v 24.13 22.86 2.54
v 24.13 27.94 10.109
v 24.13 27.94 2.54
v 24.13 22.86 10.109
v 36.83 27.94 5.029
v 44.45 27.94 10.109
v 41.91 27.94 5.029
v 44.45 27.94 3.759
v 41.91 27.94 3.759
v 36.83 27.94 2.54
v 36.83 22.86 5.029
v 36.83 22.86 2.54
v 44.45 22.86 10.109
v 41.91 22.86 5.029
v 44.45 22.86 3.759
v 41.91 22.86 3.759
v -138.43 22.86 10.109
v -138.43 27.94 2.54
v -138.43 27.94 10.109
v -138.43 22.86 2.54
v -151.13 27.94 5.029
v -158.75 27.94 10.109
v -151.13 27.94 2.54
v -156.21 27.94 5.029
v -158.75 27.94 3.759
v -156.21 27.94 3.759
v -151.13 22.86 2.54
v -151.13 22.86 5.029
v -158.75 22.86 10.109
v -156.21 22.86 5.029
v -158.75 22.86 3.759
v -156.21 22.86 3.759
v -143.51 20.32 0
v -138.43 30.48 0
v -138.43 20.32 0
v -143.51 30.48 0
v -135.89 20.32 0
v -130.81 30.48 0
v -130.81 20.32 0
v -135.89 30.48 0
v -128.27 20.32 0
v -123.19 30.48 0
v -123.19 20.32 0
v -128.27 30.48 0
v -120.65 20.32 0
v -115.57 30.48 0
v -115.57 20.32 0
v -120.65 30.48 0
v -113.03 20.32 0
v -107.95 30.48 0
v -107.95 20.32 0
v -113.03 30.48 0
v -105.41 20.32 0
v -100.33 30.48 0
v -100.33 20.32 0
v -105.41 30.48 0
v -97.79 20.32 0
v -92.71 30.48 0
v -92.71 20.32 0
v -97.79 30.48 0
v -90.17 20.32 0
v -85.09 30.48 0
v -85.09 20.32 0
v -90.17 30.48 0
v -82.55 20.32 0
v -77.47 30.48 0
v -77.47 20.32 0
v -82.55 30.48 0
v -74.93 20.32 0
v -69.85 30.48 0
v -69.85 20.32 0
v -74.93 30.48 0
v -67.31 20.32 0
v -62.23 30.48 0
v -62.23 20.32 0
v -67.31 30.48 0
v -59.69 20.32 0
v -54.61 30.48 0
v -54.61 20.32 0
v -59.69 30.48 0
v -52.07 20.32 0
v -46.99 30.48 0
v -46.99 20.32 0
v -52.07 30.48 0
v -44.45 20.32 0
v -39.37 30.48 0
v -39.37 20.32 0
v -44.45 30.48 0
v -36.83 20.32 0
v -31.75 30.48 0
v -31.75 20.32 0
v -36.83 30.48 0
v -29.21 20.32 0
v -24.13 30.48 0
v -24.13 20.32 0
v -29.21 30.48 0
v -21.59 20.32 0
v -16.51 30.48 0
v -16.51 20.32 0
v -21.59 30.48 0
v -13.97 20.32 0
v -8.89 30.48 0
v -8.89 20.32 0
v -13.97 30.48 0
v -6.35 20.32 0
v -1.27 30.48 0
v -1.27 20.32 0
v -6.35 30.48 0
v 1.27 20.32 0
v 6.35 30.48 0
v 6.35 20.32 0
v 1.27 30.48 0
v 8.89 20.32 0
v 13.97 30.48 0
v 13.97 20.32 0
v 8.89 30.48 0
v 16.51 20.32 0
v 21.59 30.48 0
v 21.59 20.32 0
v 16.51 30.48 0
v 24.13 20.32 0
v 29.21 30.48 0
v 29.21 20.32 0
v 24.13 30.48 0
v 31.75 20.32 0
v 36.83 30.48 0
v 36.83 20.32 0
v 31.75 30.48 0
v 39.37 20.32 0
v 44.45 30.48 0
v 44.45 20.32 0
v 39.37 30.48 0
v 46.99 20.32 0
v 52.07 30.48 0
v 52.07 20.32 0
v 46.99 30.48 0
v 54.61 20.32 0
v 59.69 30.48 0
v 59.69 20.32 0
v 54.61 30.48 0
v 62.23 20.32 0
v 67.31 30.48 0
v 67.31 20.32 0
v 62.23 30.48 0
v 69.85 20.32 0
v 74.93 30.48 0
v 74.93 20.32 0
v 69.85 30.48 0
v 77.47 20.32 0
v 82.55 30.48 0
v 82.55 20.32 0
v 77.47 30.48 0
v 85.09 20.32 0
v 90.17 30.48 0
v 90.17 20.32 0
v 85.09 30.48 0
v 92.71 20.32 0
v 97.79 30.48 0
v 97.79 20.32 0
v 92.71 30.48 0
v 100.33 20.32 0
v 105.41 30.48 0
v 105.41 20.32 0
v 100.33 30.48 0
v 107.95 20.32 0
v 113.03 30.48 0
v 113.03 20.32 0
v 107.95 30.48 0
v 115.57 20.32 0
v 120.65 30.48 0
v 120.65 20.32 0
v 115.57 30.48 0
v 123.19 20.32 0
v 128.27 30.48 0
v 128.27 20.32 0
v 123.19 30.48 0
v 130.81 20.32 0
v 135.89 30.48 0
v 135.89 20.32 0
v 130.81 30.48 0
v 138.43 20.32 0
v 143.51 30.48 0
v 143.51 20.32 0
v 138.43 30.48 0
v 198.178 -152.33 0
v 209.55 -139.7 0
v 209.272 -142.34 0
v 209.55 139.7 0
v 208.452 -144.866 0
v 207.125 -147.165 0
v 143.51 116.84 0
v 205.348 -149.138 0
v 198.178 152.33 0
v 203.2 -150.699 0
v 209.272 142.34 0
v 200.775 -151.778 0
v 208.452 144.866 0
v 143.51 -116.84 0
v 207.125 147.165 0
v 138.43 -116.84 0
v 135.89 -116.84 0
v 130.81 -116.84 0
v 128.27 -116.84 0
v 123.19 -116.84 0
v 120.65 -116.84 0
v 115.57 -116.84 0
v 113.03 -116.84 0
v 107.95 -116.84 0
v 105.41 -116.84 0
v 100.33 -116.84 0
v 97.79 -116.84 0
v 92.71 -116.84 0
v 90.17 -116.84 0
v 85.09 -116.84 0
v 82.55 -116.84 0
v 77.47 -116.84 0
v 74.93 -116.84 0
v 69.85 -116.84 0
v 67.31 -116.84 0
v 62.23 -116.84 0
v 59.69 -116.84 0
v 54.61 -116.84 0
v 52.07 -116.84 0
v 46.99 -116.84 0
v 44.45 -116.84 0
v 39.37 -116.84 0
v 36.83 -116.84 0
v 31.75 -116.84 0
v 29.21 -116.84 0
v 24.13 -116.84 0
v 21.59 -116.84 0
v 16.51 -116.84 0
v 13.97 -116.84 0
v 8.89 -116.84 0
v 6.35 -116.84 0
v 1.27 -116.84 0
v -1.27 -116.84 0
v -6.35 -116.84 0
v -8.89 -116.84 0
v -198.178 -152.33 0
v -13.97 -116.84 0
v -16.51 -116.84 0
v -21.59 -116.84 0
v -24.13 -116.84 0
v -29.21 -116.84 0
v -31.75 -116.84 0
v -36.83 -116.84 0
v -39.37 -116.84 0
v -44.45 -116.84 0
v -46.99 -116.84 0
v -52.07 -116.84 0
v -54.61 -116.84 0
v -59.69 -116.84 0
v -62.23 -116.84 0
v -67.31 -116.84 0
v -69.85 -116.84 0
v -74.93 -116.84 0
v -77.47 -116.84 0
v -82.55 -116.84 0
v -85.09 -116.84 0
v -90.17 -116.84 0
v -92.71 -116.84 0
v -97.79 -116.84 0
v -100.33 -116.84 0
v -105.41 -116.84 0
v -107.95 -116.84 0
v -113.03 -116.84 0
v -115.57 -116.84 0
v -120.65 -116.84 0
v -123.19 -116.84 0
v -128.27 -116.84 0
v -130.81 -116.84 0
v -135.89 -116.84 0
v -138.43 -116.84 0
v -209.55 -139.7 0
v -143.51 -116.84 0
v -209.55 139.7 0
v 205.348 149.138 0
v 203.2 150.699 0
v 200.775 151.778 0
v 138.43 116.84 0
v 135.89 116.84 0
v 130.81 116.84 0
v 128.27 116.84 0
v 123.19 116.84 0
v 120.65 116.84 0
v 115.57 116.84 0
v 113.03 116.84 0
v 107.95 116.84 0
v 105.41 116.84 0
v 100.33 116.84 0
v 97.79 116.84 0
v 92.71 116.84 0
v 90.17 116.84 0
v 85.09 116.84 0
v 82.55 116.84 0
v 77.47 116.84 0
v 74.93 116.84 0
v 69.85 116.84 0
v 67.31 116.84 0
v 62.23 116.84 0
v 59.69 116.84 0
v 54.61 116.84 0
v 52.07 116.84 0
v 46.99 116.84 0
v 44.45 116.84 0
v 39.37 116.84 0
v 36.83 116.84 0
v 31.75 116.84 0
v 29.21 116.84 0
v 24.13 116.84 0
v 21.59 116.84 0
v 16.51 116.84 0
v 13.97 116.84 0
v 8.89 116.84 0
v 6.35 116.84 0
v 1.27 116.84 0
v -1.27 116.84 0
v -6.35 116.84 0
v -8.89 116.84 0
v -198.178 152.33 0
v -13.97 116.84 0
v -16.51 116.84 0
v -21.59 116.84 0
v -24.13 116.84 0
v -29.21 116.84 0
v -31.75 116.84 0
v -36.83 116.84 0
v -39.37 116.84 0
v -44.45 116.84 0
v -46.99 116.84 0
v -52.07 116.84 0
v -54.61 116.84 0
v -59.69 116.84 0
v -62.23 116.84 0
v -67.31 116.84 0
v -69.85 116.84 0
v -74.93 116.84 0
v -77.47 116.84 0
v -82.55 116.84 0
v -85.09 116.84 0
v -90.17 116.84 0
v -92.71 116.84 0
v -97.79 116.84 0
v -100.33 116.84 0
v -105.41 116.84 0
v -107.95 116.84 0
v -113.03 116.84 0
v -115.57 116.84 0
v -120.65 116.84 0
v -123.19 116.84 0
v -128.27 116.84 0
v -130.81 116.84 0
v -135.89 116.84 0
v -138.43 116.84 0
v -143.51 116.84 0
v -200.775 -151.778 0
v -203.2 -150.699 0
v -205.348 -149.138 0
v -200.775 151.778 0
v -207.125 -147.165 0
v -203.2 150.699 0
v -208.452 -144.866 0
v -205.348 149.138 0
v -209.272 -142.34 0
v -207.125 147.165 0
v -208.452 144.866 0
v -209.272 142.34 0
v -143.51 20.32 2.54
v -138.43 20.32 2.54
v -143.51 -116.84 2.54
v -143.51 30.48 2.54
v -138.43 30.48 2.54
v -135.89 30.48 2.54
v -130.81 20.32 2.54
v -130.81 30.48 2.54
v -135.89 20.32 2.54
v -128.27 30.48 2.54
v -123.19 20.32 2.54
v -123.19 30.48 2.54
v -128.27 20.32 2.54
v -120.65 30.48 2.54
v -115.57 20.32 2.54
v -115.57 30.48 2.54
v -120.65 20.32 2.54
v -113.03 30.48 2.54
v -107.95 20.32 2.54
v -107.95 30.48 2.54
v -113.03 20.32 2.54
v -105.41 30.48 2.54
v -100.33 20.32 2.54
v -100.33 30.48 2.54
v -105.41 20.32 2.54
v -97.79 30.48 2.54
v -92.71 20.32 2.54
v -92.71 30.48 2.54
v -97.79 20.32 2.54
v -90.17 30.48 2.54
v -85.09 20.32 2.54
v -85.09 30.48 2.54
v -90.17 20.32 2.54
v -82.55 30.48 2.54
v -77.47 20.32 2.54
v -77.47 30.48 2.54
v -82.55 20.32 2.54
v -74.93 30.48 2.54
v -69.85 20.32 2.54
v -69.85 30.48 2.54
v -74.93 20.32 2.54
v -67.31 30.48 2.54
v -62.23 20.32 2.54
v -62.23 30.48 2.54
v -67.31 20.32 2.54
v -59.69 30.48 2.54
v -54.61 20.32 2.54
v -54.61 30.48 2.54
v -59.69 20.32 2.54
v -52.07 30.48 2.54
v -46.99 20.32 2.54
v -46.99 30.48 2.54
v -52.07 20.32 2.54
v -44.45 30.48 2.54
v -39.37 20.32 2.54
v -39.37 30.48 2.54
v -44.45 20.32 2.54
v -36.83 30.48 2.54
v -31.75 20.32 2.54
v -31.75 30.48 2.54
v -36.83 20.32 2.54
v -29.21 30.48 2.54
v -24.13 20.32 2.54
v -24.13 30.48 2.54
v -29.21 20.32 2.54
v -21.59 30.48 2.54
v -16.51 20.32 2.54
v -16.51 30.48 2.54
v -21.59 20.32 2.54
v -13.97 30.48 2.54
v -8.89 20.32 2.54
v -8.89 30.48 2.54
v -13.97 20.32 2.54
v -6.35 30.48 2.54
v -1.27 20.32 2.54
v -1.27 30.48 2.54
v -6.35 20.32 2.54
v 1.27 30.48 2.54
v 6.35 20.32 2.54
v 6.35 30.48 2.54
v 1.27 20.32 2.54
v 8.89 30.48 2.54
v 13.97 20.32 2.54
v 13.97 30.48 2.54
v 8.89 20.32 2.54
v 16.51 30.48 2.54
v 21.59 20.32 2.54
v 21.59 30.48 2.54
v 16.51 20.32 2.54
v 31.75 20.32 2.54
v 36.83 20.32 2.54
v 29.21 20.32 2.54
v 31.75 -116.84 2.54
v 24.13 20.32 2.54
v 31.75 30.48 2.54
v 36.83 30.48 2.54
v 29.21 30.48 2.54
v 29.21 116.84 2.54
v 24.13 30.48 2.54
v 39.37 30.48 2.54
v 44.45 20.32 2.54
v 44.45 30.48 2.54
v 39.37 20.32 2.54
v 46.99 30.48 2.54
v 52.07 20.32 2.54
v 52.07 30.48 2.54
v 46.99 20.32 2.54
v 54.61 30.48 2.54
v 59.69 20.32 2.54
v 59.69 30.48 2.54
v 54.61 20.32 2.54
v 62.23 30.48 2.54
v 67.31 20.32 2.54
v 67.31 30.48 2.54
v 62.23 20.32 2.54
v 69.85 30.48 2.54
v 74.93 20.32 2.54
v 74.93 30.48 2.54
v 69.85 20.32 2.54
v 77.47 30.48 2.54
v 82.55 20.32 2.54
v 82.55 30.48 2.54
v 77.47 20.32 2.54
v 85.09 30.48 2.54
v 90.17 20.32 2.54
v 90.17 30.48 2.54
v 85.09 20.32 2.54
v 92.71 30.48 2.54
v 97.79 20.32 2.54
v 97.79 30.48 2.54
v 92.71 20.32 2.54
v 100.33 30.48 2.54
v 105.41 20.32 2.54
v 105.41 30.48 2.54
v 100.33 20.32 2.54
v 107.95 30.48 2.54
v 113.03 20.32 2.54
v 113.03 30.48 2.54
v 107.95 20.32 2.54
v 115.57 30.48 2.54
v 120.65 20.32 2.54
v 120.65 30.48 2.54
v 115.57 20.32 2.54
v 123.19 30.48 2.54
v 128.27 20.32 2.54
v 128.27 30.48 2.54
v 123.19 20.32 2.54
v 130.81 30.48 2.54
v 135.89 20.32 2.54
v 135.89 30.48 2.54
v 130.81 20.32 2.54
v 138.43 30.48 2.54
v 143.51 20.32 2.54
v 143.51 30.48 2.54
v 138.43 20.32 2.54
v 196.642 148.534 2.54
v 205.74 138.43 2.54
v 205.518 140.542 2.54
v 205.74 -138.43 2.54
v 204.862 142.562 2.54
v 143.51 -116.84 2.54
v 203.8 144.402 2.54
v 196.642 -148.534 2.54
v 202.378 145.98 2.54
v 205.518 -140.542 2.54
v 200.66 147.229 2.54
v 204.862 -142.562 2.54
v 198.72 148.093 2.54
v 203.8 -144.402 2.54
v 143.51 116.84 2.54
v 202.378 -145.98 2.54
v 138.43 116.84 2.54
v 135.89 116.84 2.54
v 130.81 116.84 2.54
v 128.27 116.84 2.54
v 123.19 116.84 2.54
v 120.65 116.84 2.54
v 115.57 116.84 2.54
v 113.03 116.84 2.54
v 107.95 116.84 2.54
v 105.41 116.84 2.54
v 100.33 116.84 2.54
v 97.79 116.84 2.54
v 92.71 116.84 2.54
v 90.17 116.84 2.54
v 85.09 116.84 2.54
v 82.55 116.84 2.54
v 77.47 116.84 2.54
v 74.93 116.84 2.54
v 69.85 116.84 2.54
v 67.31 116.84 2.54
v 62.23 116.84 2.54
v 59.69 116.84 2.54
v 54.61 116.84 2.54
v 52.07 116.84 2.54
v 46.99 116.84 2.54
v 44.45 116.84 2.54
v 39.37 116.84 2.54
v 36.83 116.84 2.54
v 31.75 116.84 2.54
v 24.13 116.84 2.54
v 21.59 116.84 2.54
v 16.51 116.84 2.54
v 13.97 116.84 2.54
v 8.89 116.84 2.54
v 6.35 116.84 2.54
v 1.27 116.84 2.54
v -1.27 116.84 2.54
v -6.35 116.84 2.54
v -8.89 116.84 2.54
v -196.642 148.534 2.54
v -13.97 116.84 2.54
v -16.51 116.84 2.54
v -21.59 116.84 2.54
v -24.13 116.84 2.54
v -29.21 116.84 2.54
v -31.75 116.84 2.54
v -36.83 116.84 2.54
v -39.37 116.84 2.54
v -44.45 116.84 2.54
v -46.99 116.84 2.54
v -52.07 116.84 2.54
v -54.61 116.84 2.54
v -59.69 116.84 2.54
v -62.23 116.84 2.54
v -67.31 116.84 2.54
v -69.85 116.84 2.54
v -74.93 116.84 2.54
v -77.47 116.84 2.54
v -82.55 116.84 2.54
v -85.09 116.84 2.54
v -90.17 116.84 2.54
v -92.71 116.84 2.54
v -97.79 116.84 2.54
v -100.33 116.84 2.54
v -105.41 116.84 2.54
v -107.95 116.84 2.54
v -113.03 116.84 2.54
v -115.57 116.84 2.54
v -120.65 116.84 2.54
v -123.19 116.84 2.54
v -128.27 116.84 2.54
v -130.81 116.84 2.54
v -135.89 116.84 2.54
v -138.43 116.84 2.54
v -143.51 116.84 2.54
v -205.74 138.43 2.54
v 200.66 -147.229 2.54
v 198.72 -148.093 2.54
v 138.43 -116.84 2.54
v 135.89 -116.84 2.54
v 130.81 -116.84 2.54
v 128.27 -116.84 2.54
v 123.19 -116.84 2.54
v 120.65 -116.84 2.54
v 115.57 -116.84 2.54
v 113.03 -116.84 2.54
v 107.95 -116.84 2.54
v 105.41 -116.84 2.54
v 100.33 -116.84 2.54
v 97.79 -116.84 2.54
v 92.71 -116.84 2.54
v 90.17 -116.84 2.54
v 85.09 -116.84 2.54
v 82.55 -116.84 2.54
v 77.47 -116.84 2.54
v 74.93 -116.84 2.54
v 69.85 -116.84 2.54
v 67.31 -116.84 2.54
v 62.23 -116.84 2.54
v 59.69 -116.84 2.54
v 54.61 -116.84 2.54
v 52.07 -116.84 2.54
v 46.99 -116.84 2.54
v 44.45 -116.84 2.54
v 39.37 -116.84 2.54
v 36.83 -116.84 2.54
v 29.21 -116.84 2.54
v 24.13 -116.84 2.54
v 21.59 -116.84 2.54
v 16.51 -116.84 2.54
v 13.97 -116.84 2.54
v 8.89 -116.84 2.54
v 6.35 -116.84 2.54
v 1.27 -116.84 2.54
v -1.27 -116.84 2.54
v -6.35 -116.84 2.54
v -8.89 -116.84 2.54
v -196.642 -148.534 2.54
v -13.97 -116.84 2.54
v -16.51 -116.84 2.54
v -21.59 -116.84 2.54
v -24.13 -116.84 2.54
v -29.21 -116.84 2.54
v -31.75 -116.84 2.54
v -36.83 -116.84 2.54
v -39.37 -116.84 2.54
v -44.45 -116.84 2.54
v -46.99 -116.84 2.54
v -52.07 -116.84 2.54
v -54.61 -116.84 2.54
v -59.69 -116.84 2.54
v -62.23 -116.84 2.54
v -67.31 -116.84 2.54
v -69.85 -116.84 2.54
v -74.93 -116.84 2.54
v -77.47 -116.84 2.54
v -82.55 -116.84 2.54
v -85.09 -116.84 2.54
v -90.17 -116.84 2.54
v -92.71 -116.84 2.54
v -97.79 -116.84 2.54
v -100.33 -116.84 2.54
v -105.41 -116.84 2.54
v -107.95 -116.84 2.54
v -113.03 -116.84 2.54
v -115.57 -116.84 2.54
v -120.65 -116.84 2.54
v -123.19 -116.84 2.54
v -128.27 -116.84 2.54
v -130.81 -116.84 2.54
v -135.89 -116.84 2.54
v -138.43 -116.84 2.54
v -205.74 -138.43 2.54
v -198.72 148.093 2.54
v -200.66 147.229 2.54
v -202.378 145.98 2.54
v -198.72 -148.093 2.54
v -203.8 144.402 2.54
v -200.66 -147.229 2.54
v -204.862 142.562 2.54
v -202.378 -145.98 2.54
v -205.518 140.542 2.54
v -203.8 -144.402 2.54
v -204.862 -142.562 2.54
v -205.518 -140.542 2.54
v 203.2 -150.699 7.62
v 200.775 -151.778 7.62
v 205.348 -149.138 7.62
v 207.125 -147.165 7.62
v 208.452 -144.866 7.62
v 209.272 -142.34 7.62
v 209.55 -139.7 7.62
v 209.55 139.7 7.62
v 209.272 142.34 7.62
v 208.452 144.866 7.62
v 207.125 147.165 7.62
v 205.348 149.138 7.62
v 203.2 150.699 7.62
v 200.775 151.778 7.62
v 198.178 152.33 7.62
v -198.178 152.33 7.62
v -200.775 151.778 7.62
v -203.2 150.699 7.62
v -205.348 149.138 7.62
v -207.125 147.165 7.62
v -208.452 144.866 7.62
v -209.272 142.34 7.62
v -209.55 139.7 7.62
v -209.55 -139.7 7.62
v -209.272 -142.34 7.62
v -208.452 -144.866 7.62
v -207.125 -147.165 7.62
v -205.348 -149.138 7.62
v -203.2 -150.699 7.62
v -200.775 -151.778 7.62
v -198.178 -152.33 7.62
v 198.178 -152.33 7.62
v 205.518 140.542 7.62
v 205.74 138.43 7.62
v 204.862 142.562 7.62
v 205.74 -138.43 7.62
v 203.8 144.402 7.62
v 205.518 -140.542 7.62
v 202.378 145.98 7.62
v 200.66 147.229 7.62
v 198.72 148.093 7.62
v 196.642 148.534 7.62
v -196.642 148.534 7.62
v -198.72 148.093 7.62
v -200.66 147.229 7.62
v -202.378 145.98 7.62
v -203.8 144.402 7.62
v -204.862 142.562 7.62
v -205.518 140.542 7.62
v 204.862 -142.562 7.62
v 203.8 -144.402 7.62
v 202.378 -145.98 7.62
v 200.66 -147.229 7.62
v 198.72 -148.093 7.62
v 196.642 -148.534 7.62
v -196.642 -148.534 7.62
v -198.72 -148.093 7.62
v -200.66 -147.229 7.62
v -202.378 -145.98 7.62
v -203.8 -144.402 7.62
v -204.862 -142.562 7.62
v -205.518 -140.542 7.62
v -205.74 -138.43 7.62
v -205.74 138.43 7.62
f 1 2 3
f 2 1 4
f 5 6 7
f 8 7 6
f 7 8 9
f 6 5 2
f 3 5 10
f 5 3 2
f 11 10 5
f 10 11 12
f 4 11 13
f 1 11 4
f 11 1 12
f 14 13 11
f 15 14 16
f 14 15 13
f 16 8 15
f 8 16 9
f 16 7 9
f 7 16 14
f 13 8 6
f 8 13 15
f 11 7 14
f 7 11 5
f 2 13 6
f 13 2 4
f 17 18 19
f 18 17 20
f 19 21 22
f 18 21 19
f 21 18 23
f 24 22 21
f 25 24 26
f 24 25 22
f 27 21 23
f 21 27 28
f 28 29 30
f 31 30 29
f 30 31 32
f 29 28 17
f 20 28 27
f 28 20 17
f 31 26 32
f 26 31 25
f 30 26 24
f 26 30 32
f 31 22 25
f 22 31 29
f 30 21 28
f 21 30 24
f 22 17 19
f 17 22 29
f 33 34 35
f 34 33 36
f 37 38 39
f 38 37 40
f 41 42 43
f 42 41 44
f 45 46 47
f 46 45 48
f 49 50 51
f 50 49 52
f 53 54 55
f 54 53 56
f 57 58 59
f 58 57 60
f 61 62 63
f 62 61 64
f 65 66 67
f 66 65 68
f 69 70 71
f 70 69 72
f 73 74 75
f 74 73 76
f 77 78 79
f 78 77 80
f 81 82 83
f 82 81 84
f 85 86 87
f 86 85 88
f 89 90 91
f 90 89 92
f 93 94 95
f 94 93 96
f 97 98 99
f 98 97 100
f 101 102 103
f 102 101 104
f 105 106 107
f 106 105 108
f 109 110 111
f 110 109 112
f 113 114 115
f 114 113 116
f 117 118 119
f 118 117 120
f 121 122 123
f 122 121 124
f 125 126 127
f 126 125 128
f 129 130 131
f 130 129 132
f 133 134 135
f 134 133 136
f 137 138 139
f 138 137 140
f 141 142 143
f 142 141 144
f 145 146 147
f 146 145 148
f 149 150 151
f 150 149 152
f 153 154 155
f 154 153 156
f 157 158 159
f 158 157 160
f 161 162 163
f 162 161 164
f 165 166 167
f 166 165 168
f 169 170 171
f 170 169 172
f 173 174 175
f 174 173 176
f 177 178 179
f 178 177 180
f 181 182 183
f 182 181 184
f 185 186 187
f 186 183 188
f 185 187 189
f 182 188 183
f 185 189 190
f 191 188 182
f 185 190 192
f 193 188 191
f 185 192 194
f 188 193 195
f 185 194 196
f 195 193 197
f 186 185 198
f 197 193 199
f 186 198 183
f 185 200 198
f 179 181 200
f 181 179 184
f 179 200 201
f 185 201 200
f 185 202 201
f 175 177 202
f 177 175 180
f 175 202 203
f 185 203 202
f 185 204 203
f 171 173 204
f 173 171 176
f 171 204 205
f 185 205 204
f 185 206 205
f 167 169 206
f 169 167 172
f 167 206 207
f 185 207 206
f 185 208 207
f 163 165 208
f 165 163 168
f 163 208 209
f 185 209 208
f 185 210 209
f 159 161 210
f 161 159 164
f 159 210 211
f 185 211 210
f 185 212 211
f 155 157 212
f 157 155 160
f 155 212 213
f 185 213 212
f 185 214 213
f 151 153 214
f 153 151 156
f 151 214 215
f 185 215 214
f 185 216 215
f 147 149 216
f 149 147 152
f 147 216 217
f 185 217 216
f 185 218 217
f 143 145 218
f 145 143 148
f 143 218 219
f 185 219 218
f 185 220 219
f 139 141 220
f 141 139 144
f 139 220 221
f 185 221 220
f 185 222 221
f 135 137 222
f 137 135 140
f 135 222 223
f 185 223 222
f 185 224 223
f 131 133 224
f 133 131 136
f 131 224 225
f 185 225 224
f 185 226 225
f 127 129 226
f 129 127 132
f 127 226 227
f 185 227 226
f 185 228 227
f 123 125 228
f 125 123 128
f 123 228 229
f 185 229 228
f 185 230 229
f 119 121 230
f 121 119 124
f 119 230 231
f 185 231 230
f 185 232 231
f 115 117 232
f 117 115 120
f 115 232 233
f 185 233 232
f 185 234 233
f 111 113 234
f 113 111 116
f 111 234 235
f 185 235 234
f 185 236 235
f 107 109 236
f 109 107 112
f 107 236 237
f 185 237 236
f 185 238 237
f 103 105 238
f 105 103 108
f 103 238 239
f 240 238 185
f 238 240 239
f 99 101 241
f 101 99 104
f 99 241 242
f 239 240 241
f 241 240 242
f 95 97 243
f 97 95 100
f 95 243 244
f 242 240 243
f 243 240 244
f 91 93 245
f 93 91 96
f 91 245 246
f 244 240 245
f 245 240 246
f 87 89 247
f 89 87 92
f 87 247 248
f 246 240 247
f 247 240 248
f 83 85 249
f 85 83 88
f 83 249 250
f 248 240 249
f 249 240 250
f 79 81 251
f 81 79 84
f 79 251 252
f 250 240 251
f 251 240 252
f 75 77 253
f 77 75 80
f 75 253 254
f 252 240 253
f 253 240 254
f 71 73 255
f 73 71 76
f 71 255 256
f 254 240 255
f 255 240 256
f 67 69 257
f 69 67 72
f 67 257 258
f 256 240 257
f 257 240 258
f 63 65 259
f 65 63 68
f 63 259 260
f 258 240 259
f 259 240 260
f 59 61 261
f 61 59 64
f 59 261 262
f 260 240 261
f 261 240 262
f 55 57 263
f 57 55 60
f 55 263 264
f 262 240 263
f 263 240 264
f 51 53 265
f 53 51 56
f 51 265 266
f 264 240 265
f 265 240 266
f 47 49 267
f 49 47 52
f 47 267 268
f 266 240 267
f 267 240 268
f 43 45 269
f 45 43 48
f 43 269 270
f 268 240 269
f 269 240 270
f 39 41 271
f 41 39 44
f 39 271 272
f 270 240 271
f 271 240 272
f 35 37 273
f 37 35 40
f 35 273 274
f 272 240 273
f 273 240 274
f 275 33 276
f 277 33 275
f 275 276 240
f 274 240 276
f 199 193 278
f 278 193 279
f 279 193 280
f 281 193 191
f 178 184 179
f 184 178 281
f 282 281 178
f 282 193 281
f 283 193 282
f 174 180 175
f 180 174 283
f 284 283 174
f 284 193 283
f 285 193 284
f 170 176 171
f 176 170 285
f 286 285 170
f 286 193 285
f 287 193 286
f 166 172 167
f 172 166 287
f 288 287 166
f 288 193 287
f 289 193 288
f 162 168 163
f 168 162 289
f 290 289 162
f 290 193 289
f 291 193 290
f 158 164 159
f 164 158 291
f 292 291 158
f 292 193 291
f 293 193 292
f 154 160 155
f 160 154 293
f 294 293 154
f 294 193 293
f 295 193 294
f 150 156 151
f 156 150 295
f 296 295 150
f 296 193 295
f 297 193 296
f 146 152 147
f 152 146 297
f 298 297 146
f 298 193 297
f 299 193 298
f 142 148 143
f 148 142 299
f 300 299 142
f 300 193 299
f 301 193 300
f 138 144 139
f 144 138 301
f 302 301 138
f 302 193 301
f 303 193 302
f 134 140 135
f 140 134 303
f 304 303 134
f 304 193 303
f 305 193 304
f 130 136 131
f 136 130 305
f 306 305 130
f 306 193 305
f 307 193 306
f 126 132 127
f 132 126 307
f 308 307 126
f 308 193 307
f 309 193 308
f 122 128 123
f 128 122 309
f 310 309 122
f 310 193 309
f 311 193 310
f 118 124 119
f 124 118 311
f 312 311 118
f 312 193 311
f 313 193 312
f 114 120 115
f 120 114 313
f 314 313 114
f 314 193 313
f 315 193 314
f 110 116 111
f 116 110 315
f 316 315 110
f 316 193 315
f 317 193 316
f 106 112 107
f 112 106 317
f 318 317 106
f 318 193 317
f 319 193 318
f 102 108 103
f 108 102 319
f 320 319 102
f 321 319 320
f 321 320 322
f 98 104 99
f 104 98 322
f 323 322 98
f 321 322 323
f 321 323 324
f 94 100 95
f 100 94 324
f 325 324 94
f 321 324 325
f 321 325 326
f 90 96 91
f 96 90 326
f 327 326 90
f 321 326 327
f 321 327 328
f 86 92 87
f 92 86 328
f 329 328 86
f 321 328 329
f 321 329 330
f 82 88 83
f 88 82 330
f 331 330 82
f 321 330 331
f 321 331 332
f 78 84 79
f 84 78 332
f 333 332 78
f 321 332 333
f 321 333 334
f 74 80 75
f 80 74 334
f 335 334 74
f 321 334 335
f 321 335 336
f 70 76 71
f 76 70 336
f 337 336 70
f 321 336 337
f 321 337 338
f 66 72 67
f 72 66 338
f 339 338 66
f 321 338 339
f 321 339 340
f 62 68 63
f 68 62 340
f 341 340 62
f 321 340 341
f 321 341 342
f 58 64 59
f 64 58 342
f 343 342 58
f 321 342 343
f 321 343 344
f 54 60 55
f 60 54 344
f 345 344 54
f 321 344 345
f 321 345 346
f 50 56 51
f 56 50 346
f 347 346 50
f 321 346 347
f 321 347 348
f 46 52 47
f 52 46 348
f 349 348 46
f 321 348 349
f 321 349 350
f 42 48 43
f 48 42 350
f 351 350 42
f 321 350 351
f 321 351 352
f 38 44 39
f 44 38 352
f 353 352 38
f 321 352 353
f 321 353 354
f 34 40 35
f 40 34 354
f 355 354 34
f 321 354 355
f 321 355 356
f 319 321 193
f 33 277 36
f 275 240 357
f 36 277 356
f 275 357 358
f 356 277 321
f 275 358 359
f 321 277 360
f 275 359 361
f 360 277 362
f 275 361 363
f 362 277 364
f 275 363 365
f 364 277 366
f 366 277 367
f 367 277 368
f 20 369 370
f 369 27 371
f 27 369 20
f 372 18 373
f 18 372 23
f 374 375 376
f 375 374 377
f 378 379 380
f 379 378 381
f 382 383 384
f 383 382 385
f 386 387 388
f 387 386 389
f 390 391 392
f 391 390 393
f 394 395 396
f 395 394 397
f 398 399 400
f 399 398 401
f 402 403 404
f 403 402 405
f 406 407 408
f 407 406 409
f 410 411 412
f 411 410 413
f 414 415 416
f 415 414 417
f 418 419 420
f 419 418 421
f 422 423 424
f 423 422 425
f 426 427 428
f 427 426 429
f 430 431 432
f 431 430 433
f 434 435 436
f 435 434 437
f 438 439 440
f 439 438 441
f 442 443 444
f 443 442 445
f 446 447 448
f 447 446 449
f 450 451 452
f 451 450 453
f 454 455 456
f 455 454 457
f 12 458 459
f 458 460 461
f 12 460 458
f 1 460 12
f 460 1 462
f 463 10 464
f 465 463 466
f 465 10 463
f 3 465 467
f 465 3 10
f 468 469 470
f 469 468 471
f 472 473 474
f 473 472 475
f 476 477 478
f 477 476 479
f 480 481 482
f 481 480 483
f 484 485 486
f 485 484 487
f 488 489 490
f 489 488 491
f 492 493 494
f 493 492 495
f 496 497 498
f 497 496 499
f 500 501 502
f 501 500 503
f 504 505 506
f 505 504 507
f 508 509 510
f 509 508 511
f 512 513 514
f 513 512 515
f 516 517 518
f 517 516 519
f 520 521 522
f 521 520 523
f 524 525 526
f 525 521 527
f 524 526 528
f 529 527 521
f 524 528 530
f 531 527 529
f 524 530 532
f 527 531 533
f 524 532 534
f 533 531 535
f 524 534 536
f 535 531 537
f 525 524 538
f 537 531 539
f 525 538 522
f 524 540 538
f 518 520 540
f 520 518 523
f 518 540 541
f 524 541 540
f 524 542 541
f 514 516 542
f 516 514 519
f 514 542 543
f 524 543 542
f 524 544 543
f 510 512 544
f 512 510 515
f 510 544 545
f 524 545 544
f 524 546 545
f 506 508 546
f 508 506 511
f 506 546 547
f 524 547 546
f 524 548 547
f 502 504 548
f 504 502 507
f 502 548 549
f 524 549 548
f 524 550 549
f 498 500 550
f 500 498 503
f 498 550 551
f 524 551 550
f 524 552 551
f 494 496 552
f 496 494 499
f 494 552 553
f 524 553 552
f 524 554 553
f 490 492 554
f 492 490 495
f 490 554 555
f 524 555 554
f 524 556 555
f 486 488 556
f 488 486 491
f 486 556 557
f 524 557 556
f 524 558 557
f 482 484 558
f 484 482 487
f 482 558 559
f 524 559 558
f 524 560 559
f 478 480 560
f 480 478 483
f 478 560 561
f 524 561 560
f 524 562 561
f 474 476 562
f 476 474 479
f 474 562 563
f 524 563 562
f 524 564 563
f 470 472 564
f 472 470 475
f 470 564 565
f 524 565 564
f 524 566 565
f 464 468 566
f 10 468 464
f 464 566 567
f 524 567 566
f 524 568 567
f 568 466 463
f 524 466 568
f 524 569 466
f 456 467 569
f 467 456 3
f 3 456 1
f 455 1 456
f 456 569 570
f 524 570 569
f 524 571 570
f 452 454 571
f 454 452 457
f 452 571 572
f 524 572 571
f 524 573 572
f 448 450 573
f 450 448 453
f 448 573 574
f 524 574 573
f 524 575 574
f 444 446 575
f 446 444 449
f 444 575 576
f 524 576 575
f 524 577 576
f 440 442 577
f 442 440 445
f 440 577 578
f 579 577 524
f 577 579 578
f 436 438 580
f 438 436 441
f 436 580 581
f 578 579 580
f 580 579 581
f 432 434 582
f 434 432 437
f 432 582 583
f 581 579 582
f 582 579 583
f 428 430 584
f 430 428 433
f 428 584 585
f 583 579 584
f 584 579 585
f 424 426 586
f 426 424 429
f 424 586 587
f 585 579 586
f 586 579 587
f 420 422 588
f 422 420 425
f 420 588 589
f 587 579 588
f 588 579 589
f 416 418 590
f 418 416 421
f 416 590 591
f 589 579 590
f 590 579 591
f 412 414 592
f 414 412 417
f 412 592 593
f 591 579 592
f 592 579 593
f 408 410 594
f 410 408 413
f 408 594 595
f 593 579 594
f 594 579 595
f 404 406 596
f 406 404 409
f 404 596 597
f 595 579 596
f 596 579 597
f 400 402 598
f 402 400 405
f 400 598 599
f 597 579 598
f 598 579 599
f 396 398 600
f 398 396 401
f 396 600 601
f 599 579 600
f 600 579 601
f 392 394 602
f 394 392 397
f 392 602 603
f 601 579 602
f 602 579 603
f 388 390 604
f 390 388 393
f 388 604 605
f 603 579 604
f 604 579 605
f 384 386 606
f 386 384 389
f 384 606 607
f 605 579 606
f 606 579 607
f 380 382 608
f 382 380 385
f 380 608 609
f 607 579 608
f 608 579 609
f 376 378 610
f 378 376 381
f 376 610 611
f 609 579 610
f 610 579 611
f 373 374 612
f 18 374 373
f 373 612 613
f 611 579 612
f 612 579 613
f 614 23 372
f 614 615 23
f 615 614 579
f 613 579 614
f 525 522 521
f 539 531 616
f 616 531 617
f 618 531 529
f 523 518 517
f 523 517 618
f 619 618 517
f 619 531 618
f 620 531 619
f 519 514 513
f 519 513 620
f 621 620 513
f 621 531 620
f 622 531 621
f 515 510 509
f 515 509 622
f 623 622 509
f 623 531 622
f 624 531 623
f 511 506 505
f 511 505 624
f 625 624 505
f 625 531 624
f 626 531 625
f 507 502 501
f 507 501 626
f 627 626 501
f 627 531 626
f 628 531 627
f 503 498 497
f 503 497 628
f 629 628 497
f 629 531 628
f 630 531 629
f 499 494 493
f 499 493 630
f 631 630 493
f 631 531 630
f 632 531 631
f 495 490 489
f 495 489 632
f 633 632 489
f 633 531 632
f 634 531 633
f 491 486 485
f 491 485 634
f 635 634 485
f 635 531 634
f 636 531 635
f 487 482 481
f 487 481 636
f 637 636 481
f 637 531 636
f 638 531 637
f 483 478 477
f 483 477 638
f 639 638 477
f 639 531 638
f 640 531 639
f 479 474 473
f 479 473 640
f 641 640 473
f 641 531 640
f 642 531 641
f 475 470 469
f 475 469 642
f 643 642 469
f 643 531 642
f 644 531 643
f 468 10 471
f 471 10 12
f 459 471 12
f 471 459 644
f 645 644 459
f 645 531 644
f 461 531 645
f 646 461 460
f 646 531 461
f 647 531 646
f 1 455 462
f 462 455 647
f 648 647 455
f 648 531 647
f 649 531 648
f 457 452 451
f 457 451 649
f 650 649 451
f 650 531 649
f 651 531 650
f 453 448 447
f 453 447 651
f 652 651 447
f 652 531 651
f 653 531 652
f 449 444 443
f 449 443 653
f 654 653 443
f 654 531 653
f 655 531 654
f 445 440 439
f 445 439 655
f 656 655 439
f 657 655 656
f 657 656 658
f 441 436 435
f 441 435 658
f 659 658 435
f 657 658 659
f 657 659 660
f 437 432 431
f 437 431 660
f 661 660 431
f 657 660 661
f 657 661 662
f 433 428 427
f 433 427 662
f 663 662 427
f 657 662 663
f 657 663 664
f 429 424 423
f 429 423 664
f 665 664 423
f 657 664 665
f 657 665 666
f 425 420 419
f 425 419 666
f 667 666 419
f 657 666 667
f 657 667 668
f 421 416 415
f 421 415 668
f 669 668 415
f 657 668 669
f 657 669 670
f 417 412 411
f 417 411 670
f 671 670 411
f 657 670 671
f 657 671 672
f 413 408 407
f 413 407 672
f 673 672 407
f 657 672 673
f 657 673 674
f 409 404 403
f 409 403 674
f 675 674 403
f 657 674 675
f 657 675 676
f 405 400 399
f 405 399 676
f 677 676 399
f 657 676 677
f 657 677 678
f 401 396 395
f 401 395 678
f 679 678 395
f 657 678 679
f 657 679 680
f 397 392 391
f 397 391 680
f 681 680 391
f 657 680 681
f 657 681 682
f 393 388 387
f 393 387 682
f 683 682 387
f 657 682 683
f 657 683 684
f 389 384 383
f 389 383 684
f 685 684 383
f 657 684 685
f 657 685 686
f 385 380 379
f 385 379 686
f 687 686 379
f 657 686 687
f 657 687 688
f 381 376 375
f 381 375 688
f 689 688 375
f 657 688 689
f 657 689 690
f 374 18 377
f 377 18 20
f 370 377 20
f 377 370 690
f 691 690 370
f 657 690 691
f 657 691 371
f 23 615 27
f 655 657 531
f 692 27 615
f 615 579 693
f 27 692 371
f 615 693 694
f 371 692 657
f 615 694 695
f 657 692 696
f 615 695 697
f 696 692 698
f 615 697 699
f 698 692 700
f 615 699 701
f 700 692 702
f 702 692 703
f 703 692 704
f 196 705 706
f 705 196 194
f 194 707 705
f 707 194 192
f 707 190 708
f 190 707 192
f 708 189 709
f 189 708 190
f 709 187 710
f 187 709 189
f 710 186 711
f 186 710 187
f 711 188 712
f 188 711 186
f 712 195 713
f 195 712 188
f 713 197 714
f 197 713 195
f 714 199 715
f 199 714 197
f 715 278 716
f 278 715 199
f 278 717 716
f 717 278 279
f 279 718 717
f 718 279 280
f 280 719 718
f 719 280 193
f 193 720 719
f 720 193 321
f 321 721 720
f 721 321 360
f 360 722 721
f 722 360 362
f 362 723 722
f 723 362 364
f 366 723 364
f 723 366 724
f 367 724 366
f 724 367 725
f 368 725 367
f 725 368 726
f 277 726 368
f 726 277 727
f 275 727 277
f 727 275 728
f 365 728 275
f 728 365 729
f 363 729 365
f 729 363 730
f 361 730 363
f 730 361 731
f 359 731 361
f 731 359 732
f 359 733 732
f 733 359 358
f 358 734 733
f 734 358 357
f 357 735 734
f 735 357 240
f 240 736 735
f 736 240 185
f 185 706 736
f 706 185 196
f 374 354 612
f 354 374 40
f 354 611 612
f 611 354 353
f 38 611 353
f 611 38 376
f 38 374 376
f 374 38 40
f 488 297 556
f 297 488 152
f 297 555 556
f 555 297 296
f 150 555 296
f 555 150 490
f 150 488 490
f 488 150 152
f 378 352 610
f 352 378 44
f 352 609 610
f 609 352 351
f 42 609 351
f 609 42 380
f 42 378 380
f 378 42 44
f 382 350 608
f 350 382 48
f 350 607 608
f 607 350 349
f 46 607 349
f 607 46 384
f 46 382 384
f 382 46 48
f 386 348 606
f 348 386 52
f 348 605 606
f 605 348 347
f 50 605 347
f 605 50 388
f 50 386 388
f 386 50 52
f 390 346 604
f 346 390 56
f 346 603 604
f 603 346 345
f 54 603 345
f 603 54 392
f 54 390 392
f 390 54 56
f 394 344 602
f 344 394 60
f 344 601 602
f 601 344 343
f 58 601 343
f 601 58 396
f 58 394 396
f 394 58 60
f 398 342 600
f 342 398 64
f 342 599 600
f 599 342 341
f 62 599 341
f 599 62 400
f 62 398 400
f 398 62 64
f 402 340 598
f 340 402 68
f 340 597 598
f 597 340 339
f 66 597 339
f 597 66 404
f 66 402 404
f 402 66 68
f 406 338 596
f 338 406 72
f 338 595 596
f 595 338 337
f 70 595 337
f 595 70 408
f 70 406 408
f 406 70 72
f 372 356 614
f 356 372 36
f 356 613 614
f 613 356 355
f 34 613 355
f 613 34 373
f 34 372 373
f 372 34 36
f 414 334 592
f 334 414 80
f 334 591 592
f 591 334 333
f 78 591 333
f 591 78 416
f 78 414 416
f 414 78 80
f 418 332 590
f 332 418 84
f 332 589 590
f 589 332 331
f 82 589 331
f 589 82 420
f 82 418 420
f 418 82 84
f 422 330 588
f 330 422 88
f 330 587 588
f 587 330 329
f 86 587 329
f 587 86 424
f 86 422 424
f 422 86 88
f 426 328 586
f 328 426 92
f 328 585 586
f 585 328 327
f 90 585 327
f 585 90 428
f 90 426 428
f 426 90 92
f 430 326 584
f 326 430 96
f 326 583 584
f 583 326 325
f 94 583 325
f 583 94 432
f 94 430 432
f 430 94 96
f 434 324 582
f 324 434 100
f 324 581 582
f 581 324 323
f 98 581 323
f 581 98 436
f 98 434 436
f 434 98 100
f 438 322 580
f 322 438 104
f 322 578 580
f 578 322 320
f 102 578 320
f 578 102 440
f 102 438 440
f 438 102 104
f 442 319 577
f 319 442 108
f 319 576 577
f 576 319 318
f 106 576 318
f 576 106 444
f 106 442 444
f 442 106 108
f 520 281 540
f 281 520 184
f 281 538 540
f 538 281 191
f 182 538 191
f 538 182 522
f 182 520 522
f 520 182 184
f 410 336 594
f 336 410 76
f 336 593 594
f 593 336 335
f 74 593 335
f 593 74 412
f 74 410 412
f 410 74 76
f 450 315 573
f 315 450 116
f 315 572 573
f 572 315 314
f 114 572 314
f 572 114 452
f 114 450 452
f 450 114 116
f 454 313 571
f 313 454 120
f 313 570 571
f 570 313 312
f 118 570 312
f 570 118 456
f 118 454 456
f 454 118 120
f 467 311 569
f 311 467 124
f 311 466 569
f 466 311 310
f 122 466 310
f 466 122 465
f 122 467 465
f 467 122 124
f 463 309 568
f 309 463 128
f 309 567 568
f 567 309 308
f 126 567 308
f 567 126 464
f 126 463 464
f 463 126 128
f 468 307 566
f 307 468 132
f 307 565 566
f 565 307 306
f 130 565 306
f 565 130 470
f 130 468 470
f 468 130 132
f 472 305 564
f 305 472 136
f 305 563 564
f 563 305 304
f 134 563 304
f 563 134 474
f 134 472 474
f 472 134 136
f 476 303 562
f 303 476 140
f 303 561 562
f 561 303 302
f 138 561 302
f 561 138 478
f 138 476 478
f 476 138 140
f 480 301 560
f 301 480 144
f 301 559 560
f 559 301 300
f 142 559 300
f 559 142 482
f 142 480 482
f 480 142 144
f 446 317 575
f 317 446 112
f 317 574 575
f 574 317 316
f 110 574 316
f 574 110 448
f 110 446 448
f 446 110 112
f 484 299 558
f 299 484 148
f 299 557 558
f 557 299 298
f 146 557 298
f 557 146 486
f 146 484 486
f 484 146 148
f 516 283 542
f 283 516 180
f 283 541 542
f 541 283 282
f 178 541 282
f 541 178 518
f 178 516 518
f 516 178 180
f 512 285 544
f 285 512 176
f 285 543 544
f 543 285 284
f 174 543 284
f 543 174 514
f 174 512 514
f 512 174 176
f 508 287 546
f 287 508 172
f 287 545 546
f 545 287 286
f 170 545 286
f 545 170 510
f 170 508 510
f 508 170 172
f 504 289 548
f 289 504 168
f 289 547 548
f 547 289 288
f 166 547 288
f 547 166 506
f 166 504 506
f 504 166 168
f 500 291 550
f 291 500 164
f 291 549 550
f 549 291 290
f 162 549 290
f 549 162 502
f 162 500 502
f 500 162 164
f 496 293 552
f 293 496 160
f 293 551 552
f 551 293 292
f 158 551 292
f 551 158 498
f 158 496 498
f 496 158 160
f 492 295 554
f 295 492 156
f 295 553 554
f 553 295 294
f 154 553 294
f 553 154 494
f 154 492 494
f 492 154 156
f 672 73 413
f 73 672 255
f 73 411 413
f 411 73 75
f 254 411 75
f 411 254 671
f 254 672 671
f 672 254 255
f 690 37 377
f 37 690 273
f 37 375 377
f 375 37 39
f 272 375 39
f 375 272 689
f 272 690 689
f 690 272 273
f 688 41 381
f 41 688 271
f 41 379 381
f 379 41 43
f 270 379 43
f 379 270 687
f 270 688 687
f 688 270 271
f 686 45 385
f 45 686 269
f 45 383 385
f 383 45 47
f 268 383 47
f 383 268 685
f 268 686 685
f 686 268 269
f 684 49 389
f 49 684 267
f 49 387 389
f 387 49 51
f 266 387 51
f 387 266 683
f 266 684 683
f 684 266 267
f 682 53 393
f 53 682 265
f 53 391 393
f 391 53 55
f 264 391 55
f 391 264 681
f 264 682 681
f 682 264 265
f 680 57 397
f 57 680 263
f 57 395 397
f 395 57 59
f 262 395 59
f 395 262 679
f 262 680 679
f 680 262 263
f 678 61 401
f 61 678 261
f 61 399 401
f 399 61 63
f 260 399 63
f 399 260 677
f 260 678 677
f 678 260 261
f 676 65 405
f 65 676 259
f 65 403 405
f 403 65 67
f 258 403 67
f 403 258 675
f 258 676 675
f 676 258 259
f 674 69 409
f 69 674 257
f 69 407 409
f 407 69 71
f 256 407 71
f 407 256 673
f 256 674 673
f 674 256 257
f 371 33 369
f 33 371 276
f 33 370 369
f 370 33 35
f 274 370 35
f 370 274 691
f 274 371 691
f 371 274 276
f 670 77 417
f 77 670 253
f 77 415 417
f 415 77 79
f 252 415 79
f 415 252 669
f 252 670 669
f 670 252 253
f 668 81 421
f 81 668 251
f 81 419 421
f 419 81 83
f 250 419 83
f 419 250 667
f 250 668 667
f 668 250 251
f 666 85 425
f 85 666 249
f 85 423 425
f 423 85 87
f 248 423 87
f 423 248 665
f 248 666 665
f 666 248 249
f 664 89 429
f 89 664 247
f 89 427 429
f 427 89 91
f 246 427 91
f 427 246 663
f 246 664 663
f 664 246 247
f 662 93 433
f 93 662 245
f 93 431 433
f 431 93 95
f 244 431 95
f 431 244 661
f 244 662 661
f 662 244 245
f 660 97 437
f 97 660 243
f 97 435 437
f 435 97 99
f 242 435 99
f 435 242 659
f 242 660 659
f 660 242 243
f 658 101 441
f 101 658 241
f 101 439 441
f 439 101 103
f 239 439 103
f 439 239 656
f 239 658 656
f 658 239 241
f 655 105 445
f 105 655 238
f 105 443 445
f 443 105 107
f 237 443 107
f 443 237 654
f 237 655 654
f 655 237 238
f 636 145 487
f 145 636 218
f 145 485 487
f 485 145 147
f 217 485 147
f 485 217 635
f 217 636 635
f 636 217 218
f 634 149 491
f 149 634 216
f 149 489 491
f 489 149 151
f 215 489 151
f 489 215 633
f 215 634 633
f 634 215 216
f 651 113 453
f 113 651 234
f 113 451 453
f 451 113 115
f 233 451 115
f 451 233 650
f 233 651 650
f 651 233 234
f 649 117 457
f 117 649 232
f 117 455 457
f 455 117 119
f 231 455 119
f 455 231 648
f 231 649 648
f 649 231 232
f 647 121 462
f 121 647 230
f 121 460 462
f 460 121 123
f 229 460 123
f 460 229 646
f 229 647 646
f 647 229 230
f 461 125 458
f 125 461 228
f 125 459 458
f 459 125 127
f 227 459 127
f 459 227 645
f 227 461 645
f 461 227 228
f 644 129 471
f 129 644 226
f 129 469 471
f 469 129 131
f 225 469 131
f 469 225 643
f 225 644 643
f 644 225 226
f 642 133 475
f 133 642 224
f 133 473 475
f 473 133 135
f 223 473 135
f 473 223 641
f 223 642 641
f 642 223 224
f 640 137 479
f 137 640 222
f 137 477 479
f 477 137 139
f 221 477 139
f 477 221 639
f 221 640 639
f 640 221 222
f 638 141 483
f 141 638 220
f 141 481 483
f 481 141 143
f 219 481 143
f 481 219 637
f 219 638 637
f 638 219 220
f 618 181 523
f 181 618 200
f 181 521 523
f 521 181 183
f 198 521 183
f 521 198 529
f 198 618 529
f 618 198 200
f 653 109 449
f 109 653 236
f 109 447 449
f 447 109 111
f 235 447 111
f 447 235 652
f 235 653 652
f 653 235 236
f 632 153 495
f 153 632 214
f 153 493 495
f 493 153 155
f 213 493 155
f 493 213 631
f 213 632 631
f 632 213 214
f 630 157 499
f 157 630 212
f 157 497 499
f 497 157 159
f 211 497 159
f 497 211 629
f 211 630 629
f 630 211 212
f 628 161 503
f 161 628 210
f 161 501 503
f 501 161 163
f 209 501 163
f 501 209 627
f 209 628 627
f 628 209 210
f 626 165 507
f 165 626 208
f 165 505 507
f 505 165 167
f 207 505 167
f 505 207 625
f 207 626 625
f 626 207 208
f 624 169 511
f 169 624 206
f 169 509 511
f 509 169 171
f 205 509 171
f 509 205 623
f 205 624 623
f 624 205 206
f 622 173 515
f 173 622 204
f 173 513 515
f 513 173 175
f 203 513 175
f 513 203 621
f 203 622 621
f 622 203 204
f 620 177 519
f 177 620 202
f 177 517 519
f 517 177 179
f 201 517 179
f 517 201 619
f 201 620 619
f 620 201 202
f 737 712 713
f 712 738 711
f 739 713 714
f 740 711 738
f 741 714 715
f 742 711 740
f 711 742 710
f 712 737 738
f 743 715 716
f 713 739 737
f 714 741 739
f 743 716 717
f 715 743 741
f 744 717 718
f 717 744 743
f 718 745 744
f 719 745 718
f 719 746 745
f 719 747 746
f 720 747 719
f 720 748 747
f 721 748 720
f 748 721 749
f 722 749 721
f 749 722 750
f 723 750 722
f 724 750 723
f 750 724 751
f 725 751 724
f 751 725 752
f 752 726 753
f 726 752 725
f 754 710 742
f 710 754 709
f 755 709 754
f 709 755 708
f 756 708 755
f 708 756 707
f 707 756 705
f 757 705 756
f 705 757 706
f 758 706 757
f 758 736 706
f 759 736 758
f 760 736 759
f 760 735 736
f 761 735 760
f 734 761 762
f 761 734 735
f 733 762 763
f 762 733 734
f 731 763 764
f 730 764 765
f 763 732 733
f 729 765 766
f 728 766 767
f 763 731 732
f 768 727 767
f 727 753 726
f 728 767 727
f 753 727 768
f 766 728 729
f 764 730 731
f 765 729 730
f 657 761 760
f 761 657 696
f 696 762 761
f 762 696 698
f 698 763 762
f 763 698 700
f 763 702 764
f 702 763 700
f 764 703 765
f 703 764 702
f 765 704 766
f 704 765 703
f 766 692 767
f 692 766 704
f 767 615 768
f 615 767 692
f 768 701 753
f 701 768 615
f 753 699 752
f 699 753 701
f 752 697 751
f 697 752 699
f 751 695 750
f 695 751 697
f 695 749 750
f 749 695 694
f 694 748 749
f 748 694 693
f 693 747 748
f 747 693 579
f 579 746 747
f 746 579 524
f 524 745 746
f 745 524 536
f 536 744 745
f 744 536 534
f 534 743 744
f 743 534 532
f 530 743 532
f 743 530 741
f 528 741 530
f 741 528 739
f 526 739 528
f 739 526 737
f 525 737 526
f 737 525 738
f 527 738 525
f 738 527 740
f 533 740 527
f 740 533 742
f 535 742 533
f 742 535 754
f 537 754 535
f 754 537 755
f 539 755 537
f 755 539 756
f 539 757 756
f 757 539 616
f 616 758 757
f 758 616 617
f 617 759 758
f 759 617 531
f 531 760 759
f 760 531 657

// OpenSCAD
ViewScale = [0.0254, 0.0254, 0.0254];

// #The whole length is 14 in
// #The width of the hole is 9 and 1/2 in
// #The grill is 240 mm square
// #The spring clips are 1 in in from the outside

holeL=14000;
holeW=9500;
oldgrilldim=9450;

module rectHull(r, x, y)
{
    hull()
    {
        // place 4 circles in the corners, with the given r
        translate([(-x/2)+(r/2), (-y/2)+(r/2), 0])
            circle(r=r);

        translate([(x/2)-(r/2), (-y/2)+(r/2), 0])
            circle(r=r);

        translate([(-x/2)+(r/2), (y/2)-(r/2), 0])
            circle(r=r);

        translate([(x/2)-(r/2), (y/2)-(r/2), 0])
            circle(r=r);
    }
}

module model_hole()
{
    linear_extrude(625)
    difference() {
        square([holeL+2000, holeW+2000], center=true);
        square([holeL, holeW], center=true);
    }
}

module model_oldgrill()
{
    linear_extrude(200)
    difference() {
        square([oldgrilldim, oldgrilldim], center=true);
        square([oldgrilldim-3000, oldgrilldim-3000], center=true);
    }

    translate([oldgrilldim/2-1000, 0, 199])
    linear_extrude(500)
    square([500, 200], center=true);

    translate([-oldgrilldim/2+1000, 0, 199])
    linear_extrude(500)
    square([500, 200], center=true);

}

module clipmount()
{
    linear_extrude(101)
    square([500, 200], center=true);

    translate([500, 0 , 49])
    linear_extrude(51)
    square([100, 200], center=true);

    translate([150, 0 , 99])
    linear_extrude(200)
    square([800, 200], center=true);
}

module ruler(len)
{
    for(ii=[0:200:len]) {
        color(ii % 1000 ? "blue":"cyan")
        translate([ii, 0, 0])
        square([100, 100], center=true);
    }
}

module newgrill()
{
    linear_extrude(100)
    difference() {
        rectHull(500, holeL+2000, holeW+2000);
        *translate([0, 0, 0])
        square([holeL, holeW], center=true);
        for(ii=[0:300:holeL-2700]) {
            translate([-9500/2-800+ii, 2900, 0])
            square([200, 3400], center=true);
        }

        for(ii=[0:300:holeL-2700]) {
            translate([-9500/2-800+ii, -1900, 0])
            square([200, 5400], center=true);
        }
    }

    *translate([0, 0, 99])
    linear_extrude(101)
    difference() {
        rectHull(500, holeL+2000, holeW+2000);
        translate([0, 0, 0])
        square([holeL+400, holeW+400], center=true);
    }

    translate([0, 0, 99])
    linear_extrude(201)
    difference() {
        rectHull(500, holeL+2000, holeW+2000);
        translate([0, 0, 0])
        rectHull(400, holeL+1800, holeW+1800);
    }

    // Clip mounts
    //translate([oldgrilldim/2-1000, 0, 199])
    translate([1200, 1000, 99])
    clipmount();

    translate([-5700, 1000, 99])
    scale([-1.0, 1.0, 1.0])
    clipmount();

    *translate([-oldgrilldim/2+1000, 0, 199])
    linear_extrude(500)
    square([500, 200], center=true);

}

module deathstar()
{
    difference() {
        circle(2000, $fn=96);
        translate([-900, 900, 0])
        circle(500, $fn=96);
        square([6000, 200], center=true);
        for (ii=[-2000:200:2000]) {
            translate([1500, ii, 0])
            square([2500, 100], center=true);
        }
    }
}
module forViewing()
{
    *deathstar();
    *translate([0, 0, 400]) {
        color("lightgray")
        model_hole();
        translate([-7500/2+1500, 0, 0])
        color("lightgray")
        model_oldgrill();
    }
    color("cyan")
    newgrill();

    translate([-9000, -6000, 0])
    rotate([0, 0, 90])
    ruler(12000);

    translate([-9000, -7000, 0])
    ruler(18000);

    translate([-5600, -3700, 0])
    square([5500, 9500], center=true);
}

module forPrinting()
{
    color("cyan")
    newgrill();
}

scale(ViewScale)
{
//    forPrinting();
    forViewing();
}
